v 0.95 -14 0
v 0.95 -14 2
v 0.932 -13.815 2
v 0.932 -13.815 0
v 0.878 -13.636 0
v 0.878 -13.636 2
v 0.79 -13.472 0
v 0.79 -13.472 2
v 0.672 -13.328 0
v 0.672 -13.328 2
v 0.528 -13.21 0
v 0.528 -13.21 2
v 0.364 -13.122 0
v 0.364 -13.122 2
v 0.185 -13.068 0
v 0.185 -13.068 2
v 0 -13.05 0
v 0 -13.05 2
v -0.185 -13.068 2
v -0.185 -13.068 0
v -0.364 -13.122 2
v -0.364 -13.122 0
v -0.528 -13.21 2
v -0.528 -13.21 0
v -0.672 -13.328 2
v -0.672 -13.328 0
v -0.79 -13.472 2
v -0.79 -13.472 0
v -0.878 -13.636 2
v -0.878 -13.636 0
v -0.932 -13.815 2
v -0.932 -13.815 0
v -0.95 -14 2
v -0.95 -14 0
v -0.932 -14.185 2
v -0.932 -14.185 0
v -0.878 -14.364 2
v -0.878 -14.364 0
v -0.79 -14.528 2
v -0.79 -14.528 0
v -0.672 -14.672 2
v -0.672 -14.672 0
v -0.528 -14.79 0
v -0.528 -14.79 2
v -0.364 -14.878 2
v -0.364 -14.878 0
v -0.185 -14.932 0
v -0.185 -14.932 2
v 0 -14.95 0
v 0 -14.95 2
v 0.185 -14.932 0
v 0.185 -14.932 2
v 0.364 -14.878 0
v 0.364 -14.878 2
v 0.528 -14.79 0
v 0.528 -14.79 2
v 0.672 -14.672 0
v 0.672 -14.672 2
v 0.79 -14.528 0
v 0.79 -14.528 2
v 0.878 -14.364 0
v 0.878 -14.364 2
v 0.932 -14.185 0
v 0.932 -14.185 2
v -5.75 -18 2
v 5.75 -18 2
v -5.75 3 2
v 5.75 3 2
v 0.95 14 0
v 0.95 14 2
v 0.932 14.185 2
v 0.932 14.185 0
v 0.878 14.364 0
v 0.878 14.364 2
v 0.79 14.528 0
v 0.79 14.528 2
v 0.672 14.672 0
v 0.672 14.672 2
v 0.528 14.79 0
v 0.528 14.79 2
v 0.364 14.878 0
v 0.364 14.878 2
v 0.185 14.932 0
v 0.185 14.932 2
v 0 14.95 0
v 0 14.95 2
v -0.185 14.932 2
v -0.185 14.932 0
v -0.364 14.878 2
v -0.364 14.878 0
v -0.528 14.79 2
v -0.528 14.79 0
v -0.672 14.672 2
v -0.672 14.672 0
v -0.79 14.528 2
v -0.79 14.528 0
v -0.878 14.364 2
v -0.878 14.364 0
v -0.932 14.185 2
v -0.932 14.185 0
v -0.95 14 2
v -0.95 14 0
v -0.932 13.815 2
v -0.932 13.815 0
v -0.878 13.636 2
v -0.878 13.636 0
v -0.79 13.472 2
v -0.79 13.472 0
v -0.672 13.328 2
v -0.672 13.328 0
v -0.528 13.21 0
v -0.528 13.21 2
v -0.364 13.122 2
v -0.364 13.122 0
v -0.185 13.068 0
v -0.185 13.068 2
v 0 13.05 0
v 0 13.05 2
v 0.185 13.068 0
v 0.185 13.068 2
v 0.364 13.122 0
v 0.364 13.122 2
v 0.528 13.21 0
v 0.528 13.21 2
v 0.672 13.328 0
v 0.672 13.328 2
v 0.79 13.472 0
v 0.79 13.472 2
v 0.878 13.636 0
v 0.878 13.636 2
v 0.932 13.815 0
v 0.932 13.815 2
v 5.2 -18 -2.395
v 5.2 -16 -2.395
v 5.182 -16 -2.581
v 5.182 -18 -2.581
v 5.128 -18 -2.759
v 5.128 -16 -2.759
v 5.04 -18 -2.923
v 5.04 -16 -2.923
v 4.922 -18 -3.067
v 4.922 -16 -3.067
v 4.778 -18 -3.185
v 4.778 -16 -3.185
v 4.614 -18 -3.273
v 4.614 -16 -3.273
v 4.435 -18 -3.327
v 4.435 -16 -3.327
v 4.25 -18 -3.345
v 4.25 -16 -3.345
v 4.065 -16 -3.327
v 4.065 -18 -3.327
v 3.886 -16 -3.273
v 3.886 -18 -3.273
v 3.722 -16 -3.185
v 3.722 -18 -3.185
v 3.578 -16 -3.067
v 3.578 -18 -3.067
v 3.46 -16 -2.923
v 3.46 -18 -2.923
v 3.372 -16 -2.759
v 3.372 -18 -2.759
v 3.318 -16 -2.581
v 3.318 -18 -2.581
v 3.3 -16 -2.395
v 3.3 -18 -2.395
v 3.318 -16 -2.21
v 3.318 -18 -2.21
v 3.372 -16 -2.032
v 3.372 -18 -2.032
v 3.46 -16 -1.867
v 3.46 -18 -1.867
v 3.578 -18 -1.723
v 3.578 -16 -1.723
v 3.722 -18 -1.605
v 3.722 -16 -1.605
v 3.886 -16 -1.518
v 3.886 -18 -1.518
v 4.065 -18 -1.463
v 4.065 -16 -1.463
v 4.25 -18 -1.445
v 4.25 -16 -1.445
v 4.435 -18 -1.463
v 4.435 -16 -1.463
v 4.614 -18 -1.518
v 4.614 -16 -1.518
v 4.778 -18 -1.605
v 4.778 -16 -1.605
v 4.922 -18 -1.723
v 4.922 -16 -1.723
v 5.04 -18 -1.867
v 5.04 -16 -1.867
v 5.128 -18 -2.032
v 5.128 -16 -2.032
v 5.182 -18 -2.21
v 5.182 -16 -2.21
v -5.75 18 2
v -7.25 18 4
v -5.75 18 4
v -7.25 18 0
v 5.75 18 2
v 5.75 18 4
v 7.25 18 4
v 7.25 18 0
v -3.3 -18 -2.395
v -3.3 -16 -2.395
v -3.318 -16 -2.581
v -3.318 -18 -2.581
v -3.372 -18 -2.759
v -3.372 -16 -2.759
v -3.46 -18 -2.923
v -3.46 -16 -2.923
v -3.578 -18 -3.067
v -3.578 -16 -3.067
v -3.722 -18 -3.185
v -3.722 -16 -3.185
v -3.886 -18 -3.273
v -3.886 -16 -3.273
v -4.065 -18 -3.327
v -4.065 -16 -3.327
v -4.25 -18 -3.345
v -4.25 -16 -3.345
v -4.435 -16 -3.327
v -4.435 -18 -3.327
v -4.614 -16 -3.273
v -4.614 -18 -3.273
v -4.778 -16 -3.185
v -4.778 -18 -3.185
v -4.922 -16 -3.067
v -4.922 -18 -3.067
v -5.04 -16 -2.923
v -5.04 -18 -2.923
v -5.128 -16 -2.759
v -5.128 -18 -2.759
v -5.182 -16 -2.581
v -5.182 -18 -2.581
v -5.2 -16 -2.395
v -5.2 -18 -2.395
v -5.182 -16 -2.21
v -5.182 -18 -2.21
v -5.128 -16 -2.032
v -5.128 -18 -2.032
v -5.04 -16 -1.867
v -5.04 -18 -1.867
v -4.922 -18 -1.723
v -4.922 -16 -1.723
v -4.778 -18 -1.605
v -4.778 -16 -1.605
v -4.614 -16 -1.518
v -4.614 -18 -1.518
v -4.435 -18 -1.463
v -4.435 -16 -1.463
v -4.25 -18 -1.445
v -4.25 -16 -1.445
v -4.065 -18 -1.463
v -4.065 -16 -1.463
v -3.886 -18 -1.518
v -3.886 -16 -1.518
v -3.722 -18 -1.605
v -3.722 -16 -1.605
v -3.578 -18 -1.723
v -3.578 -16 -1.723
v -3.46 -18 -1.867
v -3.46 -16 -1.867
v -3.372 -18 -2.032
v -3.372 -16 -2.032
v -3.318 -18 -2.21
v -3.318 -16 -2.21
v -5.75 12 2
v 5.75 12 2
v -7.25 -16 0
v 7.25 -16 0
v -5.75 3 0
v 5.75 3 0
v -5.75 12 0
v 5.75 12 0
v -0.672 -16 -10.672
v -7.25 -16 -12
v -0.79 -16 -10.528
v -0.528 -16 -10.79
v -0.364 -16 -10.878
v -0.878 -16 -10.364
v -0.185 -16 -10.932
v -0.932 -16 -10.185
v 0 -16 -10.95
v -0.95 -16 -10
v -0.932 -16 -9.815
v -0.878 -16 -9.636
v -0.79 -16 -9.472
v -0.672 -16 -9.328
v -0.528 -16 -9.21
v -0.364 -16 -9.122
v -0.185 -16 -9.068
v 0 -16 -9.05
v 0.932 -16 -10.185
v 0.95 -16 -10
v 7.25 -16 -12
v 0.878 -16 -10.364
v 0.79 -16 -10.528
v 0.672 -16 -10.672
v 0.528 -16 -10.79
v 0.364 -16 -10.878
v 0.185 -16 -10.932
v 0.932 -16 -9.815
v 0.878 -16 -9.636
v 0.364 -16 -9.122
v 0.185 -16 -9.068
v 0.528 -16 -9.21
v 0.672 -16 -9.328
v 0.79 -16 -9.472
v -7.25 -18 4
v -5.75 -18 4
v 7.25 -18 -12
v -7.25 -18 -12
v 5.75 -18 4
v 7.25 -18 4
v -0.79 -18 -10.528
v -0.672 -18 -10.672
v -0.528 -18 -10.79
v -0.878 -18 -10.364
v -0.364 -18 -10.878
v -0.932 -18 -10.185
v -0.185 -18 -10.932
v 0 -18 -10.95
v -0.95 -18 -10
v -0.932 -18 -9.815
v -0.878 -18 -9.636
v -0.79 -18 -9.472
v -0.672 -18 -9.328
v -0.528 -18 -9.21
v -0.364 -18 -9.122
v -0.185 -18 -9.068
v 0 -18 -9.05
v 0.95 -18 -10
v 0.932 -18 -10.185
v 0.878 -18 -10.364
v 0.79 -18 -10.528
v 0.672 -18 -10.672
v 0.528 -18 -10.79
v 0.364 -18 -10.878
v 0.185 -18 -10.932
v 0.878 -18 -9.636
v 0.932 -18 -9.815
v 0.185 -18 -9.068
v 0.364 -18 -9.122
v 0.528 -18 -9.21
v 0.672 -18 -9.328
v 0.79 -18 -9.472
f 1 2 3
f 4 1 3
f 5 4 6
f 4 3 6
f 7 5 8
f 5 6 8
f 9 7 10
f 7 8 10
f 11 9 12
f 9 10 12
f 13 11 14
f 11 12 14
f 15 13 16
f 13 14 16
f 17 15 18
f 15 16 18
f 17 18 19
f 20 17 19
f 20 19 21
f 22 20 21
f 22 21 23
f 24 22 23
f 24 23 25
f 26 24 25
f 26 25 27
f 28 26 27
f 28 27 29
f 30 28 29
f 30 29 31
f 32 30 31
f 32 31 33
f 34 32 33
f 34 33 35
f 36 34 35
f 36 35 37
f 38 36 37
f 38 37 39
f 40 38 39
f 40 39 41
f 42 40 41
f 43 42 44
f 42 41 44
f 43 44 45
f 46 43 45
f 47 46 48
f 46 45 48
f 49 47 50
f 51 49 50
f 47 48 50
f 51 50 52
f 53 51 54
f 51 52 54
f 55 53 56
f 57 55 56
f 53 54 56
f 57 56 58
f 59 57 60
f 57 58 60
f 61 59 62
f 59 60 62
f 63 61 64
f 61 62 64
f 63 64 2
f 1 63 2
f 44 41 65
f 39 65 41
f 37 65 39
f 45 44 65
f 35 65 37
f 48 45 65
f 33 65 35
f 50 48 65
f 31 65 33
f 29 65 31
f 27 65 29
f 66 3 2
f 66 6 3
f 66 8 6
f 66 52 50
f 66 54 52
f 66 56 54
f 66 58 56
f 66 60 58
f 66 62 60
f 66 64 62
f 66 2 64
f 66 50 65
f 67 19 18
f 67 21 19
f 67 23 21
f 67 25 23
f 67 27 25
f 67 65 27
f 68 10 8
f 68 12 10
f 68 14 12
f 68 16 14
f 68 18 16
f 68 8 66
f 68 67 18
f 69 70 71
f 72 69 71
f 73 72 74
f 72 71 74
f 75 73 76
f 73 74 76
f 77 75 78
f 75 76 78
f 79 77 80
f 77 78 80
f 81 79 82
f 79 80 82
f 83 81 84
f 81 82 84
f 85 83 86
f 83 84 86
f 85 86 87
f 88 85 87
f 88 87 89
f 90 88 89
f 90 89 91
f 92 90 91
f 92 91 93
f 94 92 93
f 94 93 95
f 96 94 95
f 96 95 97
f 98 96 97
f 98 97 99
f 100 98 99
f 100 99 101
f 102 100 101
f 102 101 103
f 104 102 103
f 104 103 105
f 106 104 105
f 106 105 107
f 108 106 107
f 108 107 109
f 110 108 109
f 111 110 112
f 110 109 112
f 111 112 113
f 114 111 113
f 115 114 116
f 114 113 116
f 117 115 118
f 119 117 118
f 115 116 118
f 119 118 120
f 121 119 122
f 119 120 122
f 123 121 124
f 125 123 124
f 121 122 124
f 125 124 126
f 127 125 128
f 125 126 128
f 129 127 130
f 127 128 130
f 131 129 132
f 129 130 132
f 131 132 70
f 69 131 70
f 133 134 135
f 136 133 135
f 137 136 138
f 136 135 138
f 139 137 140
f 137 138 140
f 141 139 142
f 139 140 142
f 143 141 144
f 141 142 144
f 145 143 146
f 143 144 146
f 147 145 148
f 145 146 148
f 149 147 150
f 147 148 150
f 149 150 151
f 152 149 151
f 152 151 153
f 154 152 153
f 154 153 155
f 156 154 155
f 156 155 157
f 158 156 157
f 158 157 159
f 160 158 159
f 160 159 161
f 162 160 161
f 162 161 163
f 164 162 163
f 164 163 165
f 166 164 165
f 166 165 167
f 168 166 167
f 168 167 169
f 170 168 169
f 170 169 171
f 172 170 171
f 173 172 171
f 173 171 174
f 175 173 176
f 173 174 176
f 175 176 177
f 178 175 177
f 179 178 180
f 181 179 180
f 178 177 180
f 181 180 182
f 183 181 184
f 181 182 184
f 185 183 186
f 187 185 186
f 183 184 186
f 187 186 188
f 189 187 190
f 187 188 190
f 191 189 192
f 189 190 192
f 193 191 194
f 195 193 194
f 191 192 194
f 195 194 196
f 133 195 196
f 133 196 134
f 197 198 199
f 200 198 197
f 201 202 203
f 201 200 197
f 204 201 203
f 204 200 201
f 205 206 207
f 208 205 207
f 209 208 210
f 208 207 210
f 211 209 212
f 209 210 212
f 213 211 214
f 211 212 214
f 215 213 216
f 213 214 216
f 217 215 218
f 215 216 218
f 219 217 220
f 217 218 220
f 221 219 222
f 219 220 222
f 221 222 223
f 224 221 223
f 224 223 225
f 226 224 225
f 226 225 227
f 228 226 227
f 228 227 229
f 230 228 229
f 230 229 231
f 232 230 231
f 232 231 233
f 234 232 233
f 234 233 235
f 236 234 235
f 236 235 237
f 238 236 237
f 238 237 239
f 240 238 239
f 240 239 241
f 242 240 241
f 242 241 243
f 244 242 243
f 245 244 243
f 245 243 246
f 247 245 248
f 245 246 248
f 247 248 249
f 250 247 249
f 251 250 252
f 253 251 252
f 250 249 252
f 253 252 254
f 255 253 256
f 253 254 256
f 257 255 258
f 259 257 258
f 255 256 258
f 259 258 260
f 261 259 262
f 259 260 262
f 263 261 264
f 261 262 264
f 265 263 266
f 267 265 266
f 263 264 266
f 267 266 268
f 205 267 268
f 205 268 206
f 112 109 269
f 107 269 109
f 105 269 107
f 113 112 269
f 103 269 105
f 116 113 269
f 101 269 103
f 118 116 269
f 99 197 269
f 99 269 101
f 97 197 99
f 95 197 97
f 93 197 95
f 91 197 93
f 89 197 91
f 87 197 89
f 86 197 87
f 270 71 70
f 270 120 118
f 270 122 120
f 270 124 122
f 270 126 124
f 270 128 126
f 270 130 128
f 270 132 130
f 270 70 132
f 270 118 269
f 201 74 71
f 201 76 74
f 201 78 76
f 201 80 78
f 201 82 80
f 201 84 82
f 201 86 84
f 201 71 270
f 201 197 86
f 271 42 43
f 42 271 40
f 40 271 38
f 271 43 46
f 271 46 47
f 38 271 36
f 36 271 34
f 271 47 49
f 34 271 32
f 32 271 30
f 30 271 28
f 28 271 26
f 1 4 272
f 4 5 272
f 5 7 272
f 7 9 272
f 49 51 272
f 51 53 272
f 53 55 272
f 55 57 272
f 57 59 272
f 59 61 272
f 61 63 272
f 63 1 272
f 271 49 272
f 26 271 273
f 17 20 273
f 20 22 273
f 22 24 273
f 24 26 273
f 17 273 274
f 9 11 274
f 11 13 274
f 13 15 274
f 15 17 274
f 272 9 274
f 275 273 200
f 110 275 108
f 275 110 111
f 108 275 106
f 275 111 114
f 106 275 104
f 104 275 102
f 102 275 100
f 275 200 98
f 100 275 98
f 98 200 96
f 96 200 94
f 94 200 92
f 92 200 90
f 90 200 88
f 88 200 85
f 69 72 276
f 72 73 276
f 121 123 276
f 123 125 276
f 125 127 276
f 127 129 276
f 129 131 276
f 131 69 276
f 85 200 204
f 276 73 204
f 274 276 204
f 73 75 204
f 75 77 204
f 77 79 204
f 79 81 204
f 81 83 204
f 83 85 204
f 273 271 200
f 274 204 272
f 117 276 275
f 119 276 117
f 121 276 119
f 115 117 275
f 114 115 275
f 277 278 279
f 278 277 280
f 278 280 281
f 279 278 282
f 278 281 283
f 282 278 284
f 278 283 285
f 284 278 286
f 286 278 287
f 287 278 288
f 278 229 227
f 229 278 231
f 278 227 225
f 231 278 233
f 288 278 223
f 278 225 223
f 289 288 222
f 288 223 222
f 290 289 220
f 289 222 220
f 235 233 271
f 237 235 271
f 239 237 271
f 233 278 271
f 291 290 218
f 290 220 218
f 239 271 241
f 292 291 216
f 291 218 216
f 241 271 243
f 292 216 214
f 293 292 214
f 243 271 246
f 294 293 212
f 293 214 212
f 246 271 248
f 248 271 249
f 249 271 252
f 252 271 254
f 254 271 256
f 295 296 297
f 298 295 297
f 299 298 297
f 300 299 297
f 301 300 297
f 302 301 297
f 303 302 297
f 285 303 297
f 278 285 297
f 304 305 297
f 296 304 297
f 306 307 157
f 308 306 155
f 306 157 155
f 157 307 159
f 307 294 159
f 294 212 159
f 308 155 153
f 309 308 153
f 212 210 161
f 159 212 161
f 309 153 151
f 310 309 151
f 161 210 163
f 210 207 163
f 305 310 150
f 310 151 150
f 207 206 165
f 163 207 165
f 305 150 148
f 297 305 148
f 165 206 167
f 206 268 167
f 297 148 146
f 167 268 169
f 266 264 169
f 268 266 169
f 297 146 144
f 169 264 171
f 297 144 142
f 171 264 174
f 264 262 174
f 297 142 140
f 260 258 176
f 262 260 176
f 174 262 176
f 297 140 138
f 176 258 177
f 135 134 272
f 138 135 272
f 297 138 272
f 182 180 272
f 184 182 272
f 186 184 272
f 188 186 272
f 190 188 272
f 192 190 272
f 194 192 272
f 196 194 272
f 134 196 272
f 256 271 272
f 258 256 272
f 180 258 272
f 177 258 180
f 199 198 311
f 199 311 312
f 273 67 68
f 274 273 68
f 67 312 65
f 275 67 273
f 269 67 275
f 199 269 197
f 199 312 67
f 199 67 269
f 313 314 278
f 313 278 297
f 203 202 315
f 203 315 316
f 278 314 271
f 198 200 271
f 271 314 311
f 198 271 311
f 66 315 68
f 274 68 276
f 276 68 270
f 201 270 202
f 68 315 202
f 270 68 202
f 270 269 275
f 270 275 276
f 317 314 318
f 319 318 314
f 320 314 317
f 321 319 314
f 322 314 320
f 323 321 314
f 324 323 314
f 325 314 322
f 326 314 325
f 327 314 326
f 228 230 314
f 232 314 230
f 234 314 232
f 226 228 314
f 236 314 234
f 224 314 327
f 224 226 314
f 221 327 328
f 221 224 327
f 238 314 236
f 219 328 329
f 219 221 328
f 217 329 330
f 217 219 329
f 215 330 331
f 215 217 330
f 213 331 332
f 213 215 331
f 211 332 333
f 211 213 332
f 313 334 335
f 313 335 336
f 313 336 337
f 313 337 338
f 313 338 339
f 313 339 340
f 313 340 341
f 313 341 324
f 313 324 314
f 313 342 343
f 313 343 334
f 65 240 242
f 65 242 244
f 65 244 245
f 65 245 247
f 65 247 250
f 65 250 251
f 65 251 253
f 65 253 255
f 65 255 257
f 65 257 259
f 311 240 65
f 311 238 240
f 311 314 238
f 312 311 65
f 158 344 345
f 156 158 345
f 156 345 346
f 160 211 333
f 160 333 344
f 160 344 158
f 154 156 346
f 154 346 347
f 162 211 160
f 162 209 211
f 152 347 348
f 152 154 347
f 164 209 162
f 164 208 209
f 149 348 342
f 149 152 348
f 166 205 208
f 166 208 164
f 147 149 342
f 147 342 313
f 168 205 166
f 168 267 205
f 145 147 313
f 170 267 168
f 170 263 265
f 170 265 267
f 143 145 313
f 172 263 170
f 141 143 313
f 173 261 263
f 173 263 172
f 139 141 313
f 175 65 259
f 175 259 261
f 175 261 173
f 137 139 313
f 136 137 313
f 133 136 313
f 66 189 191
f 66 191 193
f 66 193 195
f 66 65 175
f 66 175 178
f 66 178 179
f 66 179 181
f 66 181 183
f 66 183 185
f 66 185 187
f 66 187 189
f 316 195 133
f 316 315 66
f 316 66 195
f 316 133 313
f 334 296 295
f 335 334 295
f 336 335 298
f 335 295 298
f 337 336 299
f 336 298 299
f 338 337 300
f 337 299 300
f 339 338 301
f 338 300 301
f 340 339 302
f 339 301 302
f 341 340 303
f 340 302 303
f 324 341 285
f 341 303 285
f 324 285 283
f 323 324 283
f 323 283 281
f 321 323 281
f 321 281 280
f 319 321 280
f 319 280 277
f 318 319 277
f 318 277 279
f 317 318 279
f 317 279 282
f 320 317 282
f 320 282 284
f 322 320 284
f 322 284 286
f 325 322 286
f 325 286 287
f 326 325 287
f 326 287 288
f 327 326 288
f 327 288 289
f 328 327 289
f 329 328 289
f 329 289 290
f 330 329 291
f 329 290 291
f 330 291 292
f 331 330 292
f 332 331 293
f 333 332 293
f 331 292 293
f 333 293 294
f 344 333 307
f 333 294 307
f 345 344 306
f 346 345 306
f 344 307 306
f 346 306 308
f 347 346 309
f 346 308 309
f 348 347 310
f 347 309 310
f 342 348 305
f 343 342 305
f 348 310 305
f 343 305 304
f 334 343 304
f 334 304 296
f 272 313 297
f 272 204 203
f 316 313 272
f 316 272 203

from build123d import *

# Parameters (mm, degrees)
SKETCH1_W           = 14.5
SKETCH1_H           = 36
BOSS_EXTRUDE1_DEPTH = 4
SKETCH3_W           = 14.5
SKETCH3_H           = 16
BOSS_EXTRUDE2_DEPTH = 2
SKETCH2_W           = 11.5
SKETCH2_H           = 36
CUT_EXTRUDE1_DEPTH  = 2
SKETCH4_R           = 0.95
CUT_EXTRUDE2_DEPTH  = 15
SKETCH5_W           = 11.5
SKETCH5_H           = 9
CUT_EXTRUDE3_DEPTH  = 15
SKETCH6_R           = 0.95
CUT_EXTRUDE4_DEPTH  = 3


with BuildPart() as part:
    # Sketch1 → Boss-Extrude1 (new body)
    with BuildSketch(Plane.XY):
        Rectangle(SKETCH1_W, SKETCH1_H)
    extrude(amount=BOSS_EXTRUDE1_DEPTH)

    # Sketch3 → Boss-Extrude2 (add)
    with BuildSketch(Plane.XZ.offset(18)):
        with Locations((0, -4)):
            Rectangle(SKETCH3_W, SKETCH3_H)
    extrude(amount=-BOSS_EXTRUDE2_DEPTH)

    # Sketch2 → Cut-Extrude1 (cut)
    with BuildSketch(Plane.XY.offset(4)):
        Rectangle(SKETCH2_W, SKETCH2_H)
    extrude(amount=-CUT_EXTRUDE1_DEPTH, mode=Mode.SUBTRACT)

    # Sketch4 → Cut-Extrude2 (cut, through all)
    with BuildSketch(Plane.XY.offset(2)):
        with Locations((0, -14)):
            Circle(SKETCH4_R)
        with Locations((0, 14)):
            Circle(SKETCH4_R)
    extrude(amount=-CUT_EXTRUDE2_DEPTH, mode=Mode.SUBTRACT)

    # Sketch5 → Cut-Extrude3 (cut, through all)
    with BuildSketch(Plane.XY.offset(2)):
        with Locations((0, 7.5)):
            Rectangle(SKETCH5_W, SKETCH5_H)
    extrude(amount=-CUT_EXTRUDE3_DEPTH, mode=Mode.SUBTRACT)

    # Sketch6 → Cut-Extrude4 (cut, through all)
    with BuildSketch(Plane(origin=(0, -16, 0), x_dir=(1, 0, 0), z_dir=(0, 1, 0))):
        with Locations((-4.25, 2.395194775)):
            Circle(SKETCH6_R)
        with Locations((4.25, 2.395194775)):
            Circle(SKETCH6_R)
        with Locations((0, 10)):
            Circle(SKETCH6_R)
    extrude(amount=-CUT_EXTRUDE4_DEPTH, mode=Mode.SUBTRACT)


solid = part.part
